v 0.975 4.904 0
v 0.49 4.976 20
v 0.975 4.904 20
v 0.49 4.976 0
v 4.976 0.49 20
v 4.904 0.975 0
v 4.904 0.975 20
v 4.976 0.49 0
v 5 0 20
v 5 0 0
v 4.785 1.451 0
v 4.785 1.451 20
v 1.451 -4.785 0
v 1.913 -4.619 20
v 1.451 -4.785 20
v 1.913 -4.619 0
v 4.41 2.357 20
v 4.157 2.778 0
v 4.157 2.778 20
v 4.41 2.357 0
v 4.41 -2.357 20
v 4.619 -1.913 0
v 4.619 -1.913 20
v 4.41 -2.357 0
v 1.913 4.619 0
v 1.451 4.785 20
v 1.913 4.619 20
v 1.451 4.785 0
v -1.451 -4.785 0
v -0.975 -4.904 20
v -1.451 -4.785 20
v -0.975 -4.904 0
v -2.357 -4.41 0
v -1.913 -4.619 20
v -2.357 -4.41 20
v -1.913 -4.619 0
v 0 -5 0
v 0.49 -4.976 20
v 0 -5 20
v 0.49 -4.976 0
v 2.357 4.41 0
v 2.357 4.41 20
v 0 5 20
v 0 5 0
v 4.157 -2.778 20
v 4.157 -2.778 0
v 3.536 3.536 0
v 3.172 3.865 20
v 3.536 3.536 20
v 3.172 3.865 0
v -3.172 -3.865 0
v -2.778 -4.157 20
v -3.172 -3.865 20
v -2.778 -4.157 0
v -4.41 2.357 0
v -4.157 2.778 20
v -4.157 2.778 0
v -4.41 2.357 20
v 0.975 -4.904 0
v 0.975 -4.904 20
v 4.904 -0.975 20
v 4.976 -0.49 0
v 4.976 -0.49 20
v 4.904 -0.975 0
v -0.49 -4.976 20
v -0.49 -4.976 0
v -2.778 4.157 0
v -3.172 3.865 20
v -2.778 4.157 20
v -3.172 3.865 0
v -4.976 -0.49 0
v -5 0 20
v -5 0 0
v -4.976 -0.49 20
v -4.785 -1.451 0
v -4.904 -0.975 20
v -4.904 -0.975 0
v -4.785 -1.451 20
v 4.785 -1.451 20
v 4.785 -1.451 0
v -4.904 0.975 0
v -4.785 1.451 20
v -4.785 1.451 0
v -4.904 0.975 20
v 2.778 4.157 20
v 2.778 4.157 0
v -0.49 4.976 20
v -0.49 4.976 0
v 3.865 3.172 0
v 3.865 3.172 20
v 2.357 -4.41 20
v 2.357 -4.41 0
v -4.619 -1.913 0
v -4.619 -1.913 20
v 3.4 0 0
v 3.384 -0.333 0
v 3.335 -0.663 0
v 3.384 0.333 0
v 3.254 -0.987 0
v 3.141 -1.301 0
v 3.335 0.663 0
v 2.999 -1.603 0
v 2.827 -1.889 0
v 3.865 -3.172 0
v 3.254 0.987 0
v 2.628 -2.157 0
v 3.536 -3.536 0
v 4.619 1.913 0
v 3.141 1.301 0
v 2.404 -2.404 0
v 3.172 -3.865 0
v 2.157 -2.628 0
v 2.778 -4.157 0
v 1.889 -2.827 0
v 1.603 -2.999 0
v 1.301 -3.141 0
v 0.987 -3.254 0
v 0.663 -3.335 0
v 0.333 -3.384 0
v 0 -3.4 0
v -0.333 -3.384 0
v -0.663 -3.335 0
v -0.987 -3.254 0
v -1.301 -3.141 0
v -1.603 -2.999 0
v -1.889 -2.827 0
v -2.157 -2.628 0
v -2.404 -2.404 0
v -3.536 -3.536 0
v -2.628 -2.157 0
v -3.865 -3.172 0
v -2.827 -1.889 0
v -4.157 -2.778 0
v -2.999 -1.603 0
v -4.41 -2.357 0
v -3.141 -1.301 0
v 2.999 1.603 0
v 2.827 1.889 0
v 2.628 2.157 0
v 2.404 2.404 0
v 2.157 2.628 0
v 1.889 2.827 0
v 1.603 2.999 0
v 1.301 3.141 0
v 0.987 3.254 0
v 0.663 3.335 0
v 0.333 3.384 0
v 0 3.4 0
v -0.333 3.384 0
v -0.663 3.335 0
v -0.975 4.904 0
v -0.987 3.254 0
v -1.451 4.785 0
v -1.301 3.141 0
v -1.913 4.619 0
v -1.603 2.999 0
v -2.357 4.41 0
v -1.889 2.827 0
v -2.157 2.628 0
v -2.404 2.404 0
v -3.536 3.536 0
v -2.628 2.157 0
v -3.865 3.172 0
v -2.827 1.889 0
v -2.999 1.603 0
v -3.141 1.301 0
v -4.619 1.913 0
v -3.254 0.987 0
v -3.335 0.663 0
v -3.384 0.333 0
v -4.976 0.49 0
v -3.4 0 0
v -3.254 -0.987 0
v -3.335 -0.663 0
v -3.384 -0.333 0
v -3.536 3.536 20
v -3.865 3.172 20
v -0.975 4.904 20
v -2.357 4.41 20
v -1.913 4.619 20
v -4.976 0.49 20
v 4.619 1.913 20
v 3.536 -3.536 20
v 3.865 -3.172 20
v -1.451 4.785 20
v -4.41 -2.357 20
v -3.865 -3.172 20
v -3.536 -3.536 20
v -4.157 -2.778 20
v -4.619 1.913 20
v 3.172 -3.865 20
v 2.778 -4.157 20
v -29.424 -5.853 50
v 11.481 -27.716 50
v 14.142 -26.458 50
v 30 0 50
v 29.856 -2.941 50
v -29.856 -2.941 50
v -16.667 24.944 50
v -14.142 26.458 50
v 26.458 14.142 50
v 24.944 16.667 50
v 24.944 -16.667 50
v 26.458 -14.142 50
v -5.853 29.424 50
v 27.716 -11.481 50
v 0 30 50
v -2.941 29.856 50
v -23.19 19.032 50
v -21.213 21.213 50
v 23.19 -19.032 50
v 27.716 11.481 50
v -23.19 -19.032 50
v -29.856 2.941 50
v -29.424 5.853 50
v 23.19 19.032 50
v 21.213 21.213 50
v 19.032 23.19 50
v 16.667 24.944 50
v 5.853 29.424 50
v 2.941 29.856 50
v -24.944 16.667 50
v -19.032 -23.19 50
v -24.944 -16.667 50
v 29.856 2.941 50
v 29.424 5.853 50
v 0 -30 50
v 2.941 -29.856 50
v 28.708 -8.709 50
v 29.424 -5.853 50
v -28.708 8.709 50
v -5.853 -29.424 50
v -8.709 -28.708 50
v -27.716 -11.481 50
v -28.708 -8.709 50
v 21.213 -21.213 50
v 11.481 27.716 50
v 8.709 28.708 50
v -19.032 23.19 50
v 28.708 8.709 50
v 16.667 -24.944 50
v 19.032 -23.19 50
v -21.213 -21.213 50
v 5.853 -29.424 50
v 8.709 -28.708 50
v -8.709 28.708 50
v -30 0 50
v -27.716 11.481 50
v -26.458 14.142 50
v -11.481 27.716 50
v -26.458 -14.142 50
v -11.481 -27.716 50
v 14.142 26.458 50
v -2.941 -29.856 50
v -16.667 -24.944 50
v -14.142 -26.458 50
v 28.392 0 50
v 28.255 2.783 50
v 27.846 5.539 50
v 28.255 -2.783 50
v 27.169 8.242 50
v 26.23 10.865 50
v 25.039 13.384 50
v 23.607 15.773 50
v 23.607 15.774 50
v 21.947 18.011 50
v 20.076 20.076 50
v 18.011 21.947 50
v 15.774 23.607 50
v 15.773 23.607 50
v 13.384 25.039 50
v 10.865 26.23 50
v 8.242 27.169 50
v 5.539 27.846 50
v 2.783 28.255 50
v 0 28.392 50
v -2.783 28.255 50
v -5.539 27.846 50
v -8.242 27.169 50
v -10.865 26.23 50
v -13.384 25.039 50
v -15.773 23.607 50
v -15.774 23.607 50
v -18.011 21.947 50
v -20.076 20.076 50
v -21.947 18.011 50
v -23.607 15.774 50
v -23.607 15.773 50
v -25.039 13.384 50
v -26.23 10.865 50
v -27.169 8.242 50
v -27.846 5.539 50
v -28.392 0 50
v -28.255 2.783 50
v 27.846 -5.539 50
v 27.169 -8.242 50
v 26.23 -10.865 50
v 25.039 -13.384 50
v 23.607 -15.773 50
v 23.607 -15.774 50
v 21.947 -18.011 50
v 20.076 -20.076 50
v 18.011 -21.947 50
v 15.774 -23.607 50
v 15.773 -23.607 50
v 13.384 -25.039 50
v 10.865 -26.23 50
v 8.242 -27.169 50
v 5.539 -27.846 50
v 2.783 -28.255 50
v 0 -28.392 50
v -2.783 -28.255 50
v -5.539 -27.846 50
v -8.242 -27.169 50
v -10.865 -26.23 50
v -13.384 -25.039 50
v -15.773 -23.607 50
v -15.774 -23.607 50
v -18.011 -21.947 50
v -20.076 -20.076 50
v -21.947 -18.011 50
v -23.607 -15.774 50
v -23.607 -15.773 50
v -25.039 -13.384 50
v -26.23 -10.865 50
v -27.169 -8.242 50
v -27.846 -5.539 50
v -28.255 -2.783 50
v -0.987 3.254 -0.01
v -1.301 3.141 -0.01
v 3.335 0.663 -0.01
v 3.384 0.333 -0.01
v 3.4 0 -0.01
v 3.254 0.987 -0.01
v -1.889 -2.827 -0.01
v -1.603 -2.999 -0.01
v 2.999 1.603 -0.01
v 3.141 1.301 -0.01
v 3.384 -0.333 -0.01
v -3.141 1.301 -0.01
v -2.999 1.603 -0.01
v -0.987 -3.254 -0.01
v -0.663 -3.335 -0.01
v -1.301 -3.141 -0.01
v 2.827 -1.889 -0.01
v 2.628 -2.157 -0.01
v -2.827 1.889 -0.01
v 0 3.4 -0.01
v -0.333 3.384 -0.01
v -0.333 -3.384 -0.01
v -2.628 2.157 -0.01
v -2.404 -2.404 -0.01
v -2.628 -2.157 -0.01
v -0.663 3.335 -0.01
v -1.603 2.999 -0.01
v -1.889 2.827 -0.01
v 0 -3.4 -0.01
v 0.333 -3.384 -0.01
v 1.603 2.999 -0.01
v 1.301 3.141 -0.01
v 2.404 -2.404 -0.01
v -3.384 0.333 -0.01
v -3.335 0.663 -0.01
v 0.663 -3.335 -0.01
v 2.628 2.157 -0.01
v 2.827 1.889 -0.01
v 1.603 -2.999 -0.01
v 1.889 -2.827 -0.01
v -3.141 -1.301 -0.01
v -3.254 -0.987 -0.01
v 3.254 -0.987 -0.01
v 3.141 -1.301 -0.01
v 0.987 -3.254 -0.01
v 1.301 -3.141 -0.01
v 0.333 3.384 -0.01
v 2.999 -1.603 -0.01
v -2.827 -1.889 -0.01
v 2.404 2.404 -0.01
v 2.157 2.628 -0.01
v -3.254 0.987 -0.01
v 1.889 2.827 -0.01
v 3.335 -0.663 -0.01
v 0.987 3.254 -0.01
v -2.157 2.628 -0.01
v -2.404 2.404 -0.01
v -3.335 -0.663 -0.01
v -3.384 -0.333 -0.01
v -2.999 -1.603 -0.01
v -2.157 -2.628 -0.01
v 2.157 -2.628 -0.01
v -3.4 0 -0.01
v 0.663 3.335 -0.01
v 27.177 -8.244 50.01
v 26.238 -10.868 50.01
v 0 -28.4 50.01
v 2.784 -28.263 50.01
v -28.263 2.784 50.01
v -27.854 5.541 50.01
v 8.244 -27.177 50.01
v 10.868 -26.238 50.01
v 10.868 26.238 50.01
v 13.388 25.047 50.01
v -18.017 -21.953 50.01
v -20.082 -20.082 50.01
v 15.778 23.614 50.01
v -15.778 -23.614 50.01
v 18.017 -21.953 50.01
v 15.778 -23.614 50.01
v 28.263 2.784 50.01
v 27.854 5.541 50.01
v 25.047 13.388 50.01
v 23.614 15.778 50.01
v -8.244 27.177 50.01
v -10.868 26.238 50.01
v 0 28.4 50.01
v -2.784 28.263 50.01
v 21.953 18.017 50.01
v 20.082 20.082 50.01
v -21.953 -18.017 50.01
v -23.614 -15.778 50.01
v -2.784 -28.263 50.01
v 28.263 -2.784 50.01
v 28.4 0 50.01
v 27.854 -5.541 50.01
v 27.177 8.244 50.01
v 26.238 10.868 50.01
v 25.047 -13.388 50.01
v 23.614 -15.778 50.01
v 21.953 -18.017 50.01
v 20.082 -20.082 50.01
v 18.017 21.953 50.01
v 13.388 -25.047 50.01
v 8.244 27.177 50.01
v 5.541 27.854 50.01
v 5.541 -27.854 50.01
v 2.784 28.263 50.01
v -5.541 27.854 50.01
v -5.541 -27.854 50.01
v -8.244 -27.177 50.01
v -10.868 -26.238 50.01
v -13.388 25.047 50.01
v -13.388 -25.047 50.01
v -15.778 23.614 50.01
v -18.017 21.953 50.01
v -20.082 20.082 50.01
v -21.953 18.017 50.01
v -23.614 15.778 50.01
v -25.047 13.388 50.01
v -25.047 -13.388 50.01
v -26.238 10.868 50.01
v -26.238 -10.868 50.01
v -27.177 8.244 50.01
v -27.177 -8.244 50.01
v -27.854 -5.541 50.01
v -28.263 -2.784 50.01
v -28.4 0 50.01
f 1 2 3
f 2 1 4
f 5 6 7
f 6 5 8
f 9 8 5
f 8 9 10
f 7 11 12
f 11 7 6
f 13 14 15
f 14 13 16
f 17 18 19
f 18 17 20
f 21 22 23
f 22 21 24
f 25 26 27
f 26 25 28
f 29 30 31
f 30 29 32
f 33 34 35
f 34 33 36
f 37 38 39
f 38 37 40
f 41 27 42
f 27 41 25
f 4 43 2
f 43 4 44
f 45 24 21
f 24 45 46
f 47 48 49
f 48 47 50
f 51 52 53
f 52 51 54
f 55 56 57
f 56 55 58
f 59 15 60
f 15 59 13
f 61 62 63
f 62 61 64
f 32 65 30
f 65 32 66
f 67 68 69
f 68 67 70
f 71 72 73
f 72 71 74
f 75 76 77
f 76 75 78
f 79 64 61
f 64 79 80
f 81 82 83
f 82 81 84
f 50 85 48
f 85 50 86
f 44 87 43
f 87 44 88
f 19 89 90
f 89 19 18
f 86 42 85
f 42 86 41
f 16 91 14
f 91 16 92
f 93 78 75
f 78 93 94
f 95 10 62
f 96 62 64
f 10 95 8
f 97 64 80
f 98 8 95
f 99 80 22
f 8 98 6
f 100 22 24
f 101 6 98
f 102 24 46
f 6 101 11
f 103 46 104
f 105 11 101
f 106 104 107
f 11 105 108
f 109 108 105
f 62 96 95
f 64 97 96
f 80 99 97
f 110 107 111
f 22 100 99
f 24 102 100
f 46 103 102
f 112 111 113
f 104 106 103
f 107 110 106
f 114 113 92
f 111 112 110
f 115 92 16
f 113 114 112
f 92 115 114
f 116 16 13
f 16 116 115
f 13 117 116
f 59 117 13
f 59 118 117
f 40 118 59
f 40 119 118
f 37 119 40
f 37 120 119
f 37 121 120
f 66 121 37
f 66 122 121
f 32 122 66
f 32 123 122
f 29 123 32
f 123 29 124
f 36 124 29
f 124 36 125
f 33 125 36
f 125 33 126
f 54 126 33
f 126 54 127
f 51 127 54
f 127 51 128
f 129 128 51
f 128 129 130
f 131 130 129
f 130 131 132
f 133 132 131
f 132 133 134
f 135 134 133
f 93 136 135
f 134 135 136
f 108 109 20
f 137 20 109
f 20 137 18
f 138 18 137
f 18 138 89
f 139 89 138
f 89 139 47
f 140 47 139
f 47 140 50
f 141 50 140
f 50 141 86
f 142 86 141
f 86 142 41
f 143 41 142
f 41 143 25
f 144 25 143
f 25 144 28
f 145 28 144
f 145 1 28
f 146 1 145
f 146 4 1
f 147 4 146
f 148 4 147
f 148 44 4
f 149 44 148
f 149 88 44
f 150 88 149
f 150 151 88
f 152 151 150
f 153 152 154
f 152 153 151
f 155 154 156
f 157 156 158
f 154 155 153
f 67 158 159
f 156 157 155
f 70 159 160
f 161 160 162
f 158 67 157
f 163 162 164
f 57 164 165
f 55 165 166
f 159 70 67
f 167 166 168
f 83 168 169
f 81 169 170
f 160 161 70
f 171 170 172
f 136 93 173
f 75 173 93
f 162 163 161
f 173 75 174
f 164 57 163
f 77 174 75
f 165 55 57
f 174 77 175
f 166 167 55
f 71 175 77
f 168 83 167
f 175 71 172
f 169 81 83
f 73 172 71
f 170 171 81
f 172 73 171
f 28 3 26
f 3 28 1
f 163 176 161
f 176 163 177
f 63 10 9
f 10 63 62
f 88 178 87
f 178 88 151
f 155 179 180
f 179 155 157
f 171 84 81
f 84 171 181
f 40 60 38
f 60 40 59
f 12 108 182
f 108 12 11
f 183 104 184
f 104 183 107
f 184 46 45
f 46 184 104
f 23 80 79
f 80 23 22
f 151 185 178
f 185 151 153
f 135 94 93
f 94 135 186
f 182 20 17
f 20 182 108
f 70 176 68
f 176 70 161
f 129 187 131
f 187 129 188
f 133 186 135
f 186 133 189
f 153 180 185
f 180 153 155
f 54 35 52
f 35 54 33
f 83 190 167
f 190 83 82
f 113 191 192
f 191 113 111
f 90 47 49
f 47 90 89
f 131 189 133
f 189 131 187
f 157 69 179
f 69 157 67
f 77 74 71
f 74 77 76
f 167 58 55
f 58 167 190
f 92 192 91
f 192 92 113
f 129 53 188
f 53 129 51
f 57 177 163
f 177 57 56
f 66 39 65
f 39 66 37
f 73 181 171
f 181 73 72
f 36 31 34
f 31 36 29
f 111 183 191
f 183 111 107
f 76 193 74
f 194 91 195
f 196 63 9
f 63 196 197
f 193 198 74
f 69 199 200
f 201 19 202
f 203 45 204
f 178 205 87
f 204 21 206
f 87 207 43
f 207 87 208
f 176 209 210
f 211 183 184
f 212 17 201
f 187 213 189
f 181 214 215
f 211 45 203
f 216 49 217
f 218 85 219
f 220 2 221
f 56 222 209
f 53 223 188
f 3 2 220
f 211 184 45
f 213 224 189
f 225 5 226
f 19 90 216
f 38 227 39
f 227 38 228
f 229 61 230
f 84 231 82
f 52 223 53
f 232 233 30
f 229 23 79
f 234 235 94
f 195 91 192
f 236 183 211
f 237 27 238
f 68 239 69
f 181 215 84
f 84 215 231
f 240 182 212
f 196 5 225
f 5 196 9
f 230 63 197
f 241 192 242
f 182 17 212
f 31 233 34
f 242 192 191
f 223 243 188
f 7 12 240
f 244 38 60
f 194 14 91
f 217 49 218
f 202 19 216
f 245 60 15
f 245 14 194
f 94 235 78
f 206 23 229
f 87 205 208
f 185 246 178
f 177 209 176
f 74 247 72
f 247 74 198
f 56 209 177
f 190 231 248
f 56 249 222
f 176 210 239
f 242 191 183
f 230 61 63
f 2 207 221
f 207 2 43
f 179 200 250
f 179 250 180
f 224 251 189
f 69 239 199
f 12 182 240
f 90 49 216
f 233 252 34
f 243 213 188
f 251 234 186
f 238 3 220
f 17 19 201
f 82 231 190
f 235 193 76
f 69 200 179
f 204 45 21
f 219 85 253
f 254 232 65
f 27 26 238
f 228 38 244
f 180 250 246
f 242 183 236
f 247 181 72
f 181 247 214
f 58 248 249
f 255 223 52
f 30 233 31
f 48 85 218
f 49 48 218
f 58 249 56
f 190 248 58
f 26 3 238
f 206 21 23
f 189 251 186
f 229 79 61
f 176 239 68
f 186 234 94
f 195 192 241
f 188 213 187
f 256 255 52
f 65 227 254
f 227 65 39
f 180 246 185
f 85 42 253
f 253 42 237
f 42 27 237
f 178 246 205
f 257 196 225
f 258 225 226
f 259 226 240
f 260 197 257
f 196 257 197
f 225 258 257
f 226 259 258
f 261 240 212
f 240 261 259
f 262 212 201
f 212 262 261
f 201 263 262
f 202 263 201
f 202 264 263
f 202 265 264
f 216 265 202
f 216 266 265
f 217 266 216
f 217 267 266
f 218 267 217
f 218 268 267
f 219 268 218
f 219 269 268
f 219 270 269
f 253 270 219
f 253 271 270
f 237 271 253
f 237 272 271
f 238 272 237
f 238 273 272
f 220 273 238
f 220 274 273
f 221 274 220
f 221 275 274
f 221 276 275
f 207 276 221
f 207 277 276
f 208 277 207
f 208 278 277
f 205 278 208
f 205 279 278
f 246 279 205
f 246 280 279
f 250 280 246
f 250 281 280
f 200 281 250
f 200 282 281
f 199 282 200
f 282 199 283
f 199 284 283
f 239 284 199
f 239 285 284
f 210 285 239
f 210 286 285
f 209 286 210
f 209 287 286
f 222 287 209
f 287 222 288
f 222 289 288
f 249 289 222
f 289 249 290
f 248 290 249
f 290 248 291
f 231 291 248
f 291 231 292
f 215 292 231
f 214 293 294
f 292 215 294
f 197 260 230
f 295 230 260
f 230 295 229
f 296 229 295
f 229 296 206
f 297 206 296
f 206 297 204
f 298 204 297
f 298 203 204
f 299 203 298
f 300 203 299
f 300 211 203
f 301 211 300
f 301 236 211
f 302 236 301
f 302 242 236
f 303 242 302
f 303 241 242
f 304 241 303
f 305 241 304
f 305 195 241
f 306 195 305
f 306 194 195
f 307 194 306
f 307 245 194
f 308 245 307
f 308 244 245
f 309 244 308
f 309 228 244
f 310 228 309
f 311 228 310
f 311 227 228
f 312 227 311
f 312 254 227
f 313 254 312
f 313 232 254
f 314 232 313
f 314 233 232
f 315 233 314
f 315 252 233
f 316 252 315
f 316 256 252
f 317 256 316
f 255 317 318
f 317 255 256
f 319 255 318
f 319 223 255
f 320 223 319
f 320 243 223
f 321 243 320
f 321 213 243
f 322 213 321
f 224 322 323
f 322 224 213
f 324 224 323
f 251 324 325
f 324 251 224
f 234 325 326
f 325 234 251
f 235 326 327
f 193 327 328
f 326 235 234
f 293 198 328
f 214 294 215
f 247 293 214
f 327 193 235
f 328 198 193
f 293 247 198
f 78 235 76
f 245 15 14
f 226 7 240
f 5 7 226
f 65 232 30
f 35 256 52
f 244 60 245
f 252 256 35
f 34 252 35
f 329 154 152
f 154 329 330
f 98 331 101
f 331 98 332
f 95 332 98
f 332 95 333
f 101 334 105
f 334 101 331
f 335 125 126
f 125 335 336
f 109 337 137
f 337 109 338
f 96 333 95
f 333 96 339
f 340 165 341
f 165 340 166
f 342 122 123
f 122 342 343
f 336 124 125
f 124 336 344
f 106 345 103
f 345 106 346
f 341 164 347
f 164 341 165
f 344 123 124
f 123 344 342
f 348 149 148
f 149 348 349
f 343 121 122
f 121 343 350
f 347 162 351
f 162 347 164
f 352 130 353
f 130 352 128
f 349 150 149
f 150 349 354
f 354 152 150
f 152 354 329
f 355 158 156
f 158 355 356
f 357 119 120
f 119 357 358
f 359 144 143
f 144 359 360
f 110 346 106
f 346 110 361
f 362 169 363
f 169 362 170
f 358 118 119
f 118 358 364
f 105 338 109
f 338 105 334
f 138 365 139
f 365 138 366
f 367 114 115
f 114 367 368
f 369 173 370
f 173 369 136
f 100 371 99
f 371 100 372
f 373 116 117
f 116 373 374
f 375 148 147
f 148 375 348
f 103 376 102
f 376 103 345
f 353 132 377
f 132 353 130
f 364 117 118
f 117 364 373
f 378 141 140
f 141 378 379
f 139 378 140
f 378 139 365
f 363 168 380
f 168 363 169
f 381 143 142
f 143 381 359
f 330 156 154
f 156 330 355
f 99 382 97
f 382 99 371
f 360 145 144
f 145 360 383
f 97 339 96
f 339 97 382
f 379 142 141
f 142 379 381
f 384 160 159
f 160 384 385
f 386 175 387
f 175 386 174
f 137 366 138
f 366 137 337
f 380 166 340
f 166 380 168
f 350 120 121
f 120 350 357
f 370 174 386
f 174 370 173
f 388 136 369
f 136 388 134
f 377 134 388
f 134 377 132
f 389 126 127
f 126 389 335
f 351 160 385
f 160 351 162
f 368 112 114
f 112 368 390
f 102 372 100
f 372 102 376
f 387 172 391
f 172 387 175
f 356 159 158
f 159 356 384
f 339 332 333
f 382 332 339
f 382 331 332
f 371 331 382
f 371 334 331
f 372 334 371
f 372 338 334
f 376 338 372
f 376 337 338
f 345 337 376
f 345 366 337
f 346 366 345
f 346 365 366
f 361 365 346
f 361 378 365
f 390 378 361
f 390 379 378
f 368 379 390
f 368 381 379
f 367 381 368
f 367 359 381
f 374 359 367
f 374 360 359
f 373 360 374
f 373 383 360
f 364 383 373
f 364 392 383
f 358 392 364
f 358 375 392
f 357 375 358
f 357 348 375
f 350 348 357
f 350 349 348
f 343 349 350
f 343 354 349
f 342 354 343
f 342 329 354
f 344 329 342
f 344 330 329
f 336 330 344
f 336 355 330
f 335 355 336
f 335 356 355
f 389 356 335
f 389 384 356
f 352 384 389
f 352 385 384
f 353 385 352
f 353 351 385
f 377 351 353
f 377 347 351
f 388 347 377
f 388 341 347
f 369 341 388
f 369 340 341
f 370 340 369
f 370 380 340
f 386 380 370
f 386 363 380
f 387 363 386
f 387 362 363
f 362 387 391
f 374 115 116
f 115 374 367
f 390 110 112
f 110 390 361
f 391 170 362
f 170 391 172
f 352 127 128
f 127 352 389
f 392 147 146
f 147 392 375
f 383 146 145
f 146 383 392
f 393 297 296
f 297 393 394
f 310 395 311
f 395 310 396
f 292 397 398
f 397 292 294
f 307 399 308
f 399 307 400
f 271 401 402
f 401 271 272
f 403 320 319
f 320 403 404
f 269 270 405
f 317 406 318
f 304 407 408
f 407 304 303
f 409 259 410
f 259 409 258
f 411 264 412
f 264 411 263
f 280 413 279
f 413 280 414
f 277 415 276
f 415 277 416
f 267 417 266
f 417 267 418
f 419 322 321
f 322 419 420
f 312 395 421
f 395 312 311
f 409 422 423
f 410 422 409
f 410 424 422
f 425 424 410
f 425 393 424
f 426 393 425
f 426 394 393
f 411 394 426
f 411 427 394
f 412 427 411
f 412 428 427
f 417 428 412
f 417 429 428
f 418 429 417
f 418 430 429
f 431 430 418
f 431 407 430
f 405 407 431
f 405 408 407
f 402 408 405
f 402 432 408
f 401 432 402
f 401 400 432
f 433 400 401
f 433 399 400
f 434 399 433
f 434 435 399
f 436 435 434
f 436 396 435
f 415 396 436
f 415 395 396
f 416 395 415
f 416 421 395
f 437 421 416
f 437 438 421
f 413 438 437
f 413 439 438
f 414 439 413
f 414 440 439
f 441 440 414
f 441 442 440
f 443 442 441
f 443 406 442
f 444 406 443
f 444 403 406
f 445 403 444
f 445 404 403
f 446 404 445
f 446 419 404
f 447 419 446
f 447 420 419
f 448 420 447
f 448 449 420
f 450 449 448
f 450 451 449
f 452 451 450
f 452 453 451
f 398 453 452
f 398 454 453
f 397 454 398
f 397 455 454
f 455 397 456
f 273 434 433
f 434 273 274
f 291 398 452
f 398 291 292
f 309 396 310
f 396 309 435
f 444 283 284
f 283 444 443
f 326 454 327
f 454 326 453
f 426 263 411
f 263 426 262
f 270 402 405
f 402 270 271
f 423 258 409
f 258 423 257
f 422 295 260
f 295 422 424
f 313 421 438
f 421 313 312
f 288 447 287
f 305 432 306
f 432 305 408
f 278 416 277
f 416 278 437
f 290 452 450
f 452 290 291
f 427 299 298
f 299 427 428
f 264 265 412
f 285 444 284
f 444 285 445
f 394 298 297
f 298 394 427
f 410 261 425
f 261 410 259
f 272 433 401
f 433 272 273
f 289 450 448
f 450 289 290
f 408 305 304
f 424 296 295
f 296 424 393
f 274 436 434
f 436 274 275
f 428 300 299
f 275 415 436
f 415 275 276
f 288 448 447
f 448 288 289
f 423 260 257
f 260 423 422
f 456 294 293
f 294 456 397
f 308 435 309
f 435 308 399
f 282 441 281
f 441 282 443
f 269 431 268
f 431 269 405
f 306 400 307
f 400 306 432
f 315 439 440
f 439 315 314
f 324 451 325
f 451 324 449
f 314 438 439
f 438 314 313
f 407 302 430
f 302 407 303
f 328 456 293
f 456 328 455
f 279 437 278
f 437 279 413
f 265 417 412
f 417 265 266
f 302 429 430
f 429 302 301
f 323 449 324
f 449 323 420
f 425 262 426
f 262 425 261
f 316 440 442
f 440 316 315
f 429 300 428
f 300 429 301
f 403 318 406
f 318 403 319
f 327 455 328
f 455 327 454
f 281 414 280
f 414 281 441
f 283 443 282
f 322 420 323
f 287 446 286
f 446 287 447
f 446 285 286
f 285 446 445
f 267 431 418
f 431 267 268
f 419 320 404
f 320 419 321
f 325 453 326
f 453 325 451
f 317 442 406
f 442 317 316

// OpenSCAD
// Lab Funnel Design
// Wall thickness: 1.6 mm
// Spout: 10 mm outer diameter, 20 mm tall (z = 0 to z = 20)
// Cone: 10 mm outer diameter at z = 20, 60 mm outer diameter at z = 50

$fn = 64;

wall_thickness = 1.6;
spout_outer_diameter = 10;
spout_height = 20;
cone_top_diameter = 10;
cone_bottom_diameter = 60;
cone_height = 30; // from z = 20 to z = 50

// Calculate inner diameters
spout_inner_diameter = spout_outer_diameter - 2 * wall_thickness;
cone_top_inner_diameter = cone_top_diameter - 2 * wall_thickness;
cone_bottom_inner_diameter = cone_bottom_diameter - 2 * wall_thickness;

// Build the funnel using difference
module funnel() {
    // Outer shape (spout + cone)
    union() {
        // Outer spout
        cylinder(h = spout_height, r = spout_outer_diameter / 2, center = false);
        
        // Outer cone (frustum)
        translate([0, 0, spout_height])
            cylinder(h = cone_height, r1 = cone_top_diameter / 2, r2 = cone_bottom_diameter / 2, center = false);
    }
    
    // Inner hole (spout + cone) - subtract from outer shape
    translate([0, 0, -0.01])
        union() {
            // Inner spout
            cylinder(h = spout_height + 0.02, r = spout_inner_diameter / 2, center = false);
            
            // Inner cone (frustum)
            translate([0, 0, spout_height])
                cylinder(h = cone_height + 0.02, r1 = cone_top_inner_diameter / 2, r2 = cone_bottom_inner_diameter / 2, center = false);
        }
}

funnel();
